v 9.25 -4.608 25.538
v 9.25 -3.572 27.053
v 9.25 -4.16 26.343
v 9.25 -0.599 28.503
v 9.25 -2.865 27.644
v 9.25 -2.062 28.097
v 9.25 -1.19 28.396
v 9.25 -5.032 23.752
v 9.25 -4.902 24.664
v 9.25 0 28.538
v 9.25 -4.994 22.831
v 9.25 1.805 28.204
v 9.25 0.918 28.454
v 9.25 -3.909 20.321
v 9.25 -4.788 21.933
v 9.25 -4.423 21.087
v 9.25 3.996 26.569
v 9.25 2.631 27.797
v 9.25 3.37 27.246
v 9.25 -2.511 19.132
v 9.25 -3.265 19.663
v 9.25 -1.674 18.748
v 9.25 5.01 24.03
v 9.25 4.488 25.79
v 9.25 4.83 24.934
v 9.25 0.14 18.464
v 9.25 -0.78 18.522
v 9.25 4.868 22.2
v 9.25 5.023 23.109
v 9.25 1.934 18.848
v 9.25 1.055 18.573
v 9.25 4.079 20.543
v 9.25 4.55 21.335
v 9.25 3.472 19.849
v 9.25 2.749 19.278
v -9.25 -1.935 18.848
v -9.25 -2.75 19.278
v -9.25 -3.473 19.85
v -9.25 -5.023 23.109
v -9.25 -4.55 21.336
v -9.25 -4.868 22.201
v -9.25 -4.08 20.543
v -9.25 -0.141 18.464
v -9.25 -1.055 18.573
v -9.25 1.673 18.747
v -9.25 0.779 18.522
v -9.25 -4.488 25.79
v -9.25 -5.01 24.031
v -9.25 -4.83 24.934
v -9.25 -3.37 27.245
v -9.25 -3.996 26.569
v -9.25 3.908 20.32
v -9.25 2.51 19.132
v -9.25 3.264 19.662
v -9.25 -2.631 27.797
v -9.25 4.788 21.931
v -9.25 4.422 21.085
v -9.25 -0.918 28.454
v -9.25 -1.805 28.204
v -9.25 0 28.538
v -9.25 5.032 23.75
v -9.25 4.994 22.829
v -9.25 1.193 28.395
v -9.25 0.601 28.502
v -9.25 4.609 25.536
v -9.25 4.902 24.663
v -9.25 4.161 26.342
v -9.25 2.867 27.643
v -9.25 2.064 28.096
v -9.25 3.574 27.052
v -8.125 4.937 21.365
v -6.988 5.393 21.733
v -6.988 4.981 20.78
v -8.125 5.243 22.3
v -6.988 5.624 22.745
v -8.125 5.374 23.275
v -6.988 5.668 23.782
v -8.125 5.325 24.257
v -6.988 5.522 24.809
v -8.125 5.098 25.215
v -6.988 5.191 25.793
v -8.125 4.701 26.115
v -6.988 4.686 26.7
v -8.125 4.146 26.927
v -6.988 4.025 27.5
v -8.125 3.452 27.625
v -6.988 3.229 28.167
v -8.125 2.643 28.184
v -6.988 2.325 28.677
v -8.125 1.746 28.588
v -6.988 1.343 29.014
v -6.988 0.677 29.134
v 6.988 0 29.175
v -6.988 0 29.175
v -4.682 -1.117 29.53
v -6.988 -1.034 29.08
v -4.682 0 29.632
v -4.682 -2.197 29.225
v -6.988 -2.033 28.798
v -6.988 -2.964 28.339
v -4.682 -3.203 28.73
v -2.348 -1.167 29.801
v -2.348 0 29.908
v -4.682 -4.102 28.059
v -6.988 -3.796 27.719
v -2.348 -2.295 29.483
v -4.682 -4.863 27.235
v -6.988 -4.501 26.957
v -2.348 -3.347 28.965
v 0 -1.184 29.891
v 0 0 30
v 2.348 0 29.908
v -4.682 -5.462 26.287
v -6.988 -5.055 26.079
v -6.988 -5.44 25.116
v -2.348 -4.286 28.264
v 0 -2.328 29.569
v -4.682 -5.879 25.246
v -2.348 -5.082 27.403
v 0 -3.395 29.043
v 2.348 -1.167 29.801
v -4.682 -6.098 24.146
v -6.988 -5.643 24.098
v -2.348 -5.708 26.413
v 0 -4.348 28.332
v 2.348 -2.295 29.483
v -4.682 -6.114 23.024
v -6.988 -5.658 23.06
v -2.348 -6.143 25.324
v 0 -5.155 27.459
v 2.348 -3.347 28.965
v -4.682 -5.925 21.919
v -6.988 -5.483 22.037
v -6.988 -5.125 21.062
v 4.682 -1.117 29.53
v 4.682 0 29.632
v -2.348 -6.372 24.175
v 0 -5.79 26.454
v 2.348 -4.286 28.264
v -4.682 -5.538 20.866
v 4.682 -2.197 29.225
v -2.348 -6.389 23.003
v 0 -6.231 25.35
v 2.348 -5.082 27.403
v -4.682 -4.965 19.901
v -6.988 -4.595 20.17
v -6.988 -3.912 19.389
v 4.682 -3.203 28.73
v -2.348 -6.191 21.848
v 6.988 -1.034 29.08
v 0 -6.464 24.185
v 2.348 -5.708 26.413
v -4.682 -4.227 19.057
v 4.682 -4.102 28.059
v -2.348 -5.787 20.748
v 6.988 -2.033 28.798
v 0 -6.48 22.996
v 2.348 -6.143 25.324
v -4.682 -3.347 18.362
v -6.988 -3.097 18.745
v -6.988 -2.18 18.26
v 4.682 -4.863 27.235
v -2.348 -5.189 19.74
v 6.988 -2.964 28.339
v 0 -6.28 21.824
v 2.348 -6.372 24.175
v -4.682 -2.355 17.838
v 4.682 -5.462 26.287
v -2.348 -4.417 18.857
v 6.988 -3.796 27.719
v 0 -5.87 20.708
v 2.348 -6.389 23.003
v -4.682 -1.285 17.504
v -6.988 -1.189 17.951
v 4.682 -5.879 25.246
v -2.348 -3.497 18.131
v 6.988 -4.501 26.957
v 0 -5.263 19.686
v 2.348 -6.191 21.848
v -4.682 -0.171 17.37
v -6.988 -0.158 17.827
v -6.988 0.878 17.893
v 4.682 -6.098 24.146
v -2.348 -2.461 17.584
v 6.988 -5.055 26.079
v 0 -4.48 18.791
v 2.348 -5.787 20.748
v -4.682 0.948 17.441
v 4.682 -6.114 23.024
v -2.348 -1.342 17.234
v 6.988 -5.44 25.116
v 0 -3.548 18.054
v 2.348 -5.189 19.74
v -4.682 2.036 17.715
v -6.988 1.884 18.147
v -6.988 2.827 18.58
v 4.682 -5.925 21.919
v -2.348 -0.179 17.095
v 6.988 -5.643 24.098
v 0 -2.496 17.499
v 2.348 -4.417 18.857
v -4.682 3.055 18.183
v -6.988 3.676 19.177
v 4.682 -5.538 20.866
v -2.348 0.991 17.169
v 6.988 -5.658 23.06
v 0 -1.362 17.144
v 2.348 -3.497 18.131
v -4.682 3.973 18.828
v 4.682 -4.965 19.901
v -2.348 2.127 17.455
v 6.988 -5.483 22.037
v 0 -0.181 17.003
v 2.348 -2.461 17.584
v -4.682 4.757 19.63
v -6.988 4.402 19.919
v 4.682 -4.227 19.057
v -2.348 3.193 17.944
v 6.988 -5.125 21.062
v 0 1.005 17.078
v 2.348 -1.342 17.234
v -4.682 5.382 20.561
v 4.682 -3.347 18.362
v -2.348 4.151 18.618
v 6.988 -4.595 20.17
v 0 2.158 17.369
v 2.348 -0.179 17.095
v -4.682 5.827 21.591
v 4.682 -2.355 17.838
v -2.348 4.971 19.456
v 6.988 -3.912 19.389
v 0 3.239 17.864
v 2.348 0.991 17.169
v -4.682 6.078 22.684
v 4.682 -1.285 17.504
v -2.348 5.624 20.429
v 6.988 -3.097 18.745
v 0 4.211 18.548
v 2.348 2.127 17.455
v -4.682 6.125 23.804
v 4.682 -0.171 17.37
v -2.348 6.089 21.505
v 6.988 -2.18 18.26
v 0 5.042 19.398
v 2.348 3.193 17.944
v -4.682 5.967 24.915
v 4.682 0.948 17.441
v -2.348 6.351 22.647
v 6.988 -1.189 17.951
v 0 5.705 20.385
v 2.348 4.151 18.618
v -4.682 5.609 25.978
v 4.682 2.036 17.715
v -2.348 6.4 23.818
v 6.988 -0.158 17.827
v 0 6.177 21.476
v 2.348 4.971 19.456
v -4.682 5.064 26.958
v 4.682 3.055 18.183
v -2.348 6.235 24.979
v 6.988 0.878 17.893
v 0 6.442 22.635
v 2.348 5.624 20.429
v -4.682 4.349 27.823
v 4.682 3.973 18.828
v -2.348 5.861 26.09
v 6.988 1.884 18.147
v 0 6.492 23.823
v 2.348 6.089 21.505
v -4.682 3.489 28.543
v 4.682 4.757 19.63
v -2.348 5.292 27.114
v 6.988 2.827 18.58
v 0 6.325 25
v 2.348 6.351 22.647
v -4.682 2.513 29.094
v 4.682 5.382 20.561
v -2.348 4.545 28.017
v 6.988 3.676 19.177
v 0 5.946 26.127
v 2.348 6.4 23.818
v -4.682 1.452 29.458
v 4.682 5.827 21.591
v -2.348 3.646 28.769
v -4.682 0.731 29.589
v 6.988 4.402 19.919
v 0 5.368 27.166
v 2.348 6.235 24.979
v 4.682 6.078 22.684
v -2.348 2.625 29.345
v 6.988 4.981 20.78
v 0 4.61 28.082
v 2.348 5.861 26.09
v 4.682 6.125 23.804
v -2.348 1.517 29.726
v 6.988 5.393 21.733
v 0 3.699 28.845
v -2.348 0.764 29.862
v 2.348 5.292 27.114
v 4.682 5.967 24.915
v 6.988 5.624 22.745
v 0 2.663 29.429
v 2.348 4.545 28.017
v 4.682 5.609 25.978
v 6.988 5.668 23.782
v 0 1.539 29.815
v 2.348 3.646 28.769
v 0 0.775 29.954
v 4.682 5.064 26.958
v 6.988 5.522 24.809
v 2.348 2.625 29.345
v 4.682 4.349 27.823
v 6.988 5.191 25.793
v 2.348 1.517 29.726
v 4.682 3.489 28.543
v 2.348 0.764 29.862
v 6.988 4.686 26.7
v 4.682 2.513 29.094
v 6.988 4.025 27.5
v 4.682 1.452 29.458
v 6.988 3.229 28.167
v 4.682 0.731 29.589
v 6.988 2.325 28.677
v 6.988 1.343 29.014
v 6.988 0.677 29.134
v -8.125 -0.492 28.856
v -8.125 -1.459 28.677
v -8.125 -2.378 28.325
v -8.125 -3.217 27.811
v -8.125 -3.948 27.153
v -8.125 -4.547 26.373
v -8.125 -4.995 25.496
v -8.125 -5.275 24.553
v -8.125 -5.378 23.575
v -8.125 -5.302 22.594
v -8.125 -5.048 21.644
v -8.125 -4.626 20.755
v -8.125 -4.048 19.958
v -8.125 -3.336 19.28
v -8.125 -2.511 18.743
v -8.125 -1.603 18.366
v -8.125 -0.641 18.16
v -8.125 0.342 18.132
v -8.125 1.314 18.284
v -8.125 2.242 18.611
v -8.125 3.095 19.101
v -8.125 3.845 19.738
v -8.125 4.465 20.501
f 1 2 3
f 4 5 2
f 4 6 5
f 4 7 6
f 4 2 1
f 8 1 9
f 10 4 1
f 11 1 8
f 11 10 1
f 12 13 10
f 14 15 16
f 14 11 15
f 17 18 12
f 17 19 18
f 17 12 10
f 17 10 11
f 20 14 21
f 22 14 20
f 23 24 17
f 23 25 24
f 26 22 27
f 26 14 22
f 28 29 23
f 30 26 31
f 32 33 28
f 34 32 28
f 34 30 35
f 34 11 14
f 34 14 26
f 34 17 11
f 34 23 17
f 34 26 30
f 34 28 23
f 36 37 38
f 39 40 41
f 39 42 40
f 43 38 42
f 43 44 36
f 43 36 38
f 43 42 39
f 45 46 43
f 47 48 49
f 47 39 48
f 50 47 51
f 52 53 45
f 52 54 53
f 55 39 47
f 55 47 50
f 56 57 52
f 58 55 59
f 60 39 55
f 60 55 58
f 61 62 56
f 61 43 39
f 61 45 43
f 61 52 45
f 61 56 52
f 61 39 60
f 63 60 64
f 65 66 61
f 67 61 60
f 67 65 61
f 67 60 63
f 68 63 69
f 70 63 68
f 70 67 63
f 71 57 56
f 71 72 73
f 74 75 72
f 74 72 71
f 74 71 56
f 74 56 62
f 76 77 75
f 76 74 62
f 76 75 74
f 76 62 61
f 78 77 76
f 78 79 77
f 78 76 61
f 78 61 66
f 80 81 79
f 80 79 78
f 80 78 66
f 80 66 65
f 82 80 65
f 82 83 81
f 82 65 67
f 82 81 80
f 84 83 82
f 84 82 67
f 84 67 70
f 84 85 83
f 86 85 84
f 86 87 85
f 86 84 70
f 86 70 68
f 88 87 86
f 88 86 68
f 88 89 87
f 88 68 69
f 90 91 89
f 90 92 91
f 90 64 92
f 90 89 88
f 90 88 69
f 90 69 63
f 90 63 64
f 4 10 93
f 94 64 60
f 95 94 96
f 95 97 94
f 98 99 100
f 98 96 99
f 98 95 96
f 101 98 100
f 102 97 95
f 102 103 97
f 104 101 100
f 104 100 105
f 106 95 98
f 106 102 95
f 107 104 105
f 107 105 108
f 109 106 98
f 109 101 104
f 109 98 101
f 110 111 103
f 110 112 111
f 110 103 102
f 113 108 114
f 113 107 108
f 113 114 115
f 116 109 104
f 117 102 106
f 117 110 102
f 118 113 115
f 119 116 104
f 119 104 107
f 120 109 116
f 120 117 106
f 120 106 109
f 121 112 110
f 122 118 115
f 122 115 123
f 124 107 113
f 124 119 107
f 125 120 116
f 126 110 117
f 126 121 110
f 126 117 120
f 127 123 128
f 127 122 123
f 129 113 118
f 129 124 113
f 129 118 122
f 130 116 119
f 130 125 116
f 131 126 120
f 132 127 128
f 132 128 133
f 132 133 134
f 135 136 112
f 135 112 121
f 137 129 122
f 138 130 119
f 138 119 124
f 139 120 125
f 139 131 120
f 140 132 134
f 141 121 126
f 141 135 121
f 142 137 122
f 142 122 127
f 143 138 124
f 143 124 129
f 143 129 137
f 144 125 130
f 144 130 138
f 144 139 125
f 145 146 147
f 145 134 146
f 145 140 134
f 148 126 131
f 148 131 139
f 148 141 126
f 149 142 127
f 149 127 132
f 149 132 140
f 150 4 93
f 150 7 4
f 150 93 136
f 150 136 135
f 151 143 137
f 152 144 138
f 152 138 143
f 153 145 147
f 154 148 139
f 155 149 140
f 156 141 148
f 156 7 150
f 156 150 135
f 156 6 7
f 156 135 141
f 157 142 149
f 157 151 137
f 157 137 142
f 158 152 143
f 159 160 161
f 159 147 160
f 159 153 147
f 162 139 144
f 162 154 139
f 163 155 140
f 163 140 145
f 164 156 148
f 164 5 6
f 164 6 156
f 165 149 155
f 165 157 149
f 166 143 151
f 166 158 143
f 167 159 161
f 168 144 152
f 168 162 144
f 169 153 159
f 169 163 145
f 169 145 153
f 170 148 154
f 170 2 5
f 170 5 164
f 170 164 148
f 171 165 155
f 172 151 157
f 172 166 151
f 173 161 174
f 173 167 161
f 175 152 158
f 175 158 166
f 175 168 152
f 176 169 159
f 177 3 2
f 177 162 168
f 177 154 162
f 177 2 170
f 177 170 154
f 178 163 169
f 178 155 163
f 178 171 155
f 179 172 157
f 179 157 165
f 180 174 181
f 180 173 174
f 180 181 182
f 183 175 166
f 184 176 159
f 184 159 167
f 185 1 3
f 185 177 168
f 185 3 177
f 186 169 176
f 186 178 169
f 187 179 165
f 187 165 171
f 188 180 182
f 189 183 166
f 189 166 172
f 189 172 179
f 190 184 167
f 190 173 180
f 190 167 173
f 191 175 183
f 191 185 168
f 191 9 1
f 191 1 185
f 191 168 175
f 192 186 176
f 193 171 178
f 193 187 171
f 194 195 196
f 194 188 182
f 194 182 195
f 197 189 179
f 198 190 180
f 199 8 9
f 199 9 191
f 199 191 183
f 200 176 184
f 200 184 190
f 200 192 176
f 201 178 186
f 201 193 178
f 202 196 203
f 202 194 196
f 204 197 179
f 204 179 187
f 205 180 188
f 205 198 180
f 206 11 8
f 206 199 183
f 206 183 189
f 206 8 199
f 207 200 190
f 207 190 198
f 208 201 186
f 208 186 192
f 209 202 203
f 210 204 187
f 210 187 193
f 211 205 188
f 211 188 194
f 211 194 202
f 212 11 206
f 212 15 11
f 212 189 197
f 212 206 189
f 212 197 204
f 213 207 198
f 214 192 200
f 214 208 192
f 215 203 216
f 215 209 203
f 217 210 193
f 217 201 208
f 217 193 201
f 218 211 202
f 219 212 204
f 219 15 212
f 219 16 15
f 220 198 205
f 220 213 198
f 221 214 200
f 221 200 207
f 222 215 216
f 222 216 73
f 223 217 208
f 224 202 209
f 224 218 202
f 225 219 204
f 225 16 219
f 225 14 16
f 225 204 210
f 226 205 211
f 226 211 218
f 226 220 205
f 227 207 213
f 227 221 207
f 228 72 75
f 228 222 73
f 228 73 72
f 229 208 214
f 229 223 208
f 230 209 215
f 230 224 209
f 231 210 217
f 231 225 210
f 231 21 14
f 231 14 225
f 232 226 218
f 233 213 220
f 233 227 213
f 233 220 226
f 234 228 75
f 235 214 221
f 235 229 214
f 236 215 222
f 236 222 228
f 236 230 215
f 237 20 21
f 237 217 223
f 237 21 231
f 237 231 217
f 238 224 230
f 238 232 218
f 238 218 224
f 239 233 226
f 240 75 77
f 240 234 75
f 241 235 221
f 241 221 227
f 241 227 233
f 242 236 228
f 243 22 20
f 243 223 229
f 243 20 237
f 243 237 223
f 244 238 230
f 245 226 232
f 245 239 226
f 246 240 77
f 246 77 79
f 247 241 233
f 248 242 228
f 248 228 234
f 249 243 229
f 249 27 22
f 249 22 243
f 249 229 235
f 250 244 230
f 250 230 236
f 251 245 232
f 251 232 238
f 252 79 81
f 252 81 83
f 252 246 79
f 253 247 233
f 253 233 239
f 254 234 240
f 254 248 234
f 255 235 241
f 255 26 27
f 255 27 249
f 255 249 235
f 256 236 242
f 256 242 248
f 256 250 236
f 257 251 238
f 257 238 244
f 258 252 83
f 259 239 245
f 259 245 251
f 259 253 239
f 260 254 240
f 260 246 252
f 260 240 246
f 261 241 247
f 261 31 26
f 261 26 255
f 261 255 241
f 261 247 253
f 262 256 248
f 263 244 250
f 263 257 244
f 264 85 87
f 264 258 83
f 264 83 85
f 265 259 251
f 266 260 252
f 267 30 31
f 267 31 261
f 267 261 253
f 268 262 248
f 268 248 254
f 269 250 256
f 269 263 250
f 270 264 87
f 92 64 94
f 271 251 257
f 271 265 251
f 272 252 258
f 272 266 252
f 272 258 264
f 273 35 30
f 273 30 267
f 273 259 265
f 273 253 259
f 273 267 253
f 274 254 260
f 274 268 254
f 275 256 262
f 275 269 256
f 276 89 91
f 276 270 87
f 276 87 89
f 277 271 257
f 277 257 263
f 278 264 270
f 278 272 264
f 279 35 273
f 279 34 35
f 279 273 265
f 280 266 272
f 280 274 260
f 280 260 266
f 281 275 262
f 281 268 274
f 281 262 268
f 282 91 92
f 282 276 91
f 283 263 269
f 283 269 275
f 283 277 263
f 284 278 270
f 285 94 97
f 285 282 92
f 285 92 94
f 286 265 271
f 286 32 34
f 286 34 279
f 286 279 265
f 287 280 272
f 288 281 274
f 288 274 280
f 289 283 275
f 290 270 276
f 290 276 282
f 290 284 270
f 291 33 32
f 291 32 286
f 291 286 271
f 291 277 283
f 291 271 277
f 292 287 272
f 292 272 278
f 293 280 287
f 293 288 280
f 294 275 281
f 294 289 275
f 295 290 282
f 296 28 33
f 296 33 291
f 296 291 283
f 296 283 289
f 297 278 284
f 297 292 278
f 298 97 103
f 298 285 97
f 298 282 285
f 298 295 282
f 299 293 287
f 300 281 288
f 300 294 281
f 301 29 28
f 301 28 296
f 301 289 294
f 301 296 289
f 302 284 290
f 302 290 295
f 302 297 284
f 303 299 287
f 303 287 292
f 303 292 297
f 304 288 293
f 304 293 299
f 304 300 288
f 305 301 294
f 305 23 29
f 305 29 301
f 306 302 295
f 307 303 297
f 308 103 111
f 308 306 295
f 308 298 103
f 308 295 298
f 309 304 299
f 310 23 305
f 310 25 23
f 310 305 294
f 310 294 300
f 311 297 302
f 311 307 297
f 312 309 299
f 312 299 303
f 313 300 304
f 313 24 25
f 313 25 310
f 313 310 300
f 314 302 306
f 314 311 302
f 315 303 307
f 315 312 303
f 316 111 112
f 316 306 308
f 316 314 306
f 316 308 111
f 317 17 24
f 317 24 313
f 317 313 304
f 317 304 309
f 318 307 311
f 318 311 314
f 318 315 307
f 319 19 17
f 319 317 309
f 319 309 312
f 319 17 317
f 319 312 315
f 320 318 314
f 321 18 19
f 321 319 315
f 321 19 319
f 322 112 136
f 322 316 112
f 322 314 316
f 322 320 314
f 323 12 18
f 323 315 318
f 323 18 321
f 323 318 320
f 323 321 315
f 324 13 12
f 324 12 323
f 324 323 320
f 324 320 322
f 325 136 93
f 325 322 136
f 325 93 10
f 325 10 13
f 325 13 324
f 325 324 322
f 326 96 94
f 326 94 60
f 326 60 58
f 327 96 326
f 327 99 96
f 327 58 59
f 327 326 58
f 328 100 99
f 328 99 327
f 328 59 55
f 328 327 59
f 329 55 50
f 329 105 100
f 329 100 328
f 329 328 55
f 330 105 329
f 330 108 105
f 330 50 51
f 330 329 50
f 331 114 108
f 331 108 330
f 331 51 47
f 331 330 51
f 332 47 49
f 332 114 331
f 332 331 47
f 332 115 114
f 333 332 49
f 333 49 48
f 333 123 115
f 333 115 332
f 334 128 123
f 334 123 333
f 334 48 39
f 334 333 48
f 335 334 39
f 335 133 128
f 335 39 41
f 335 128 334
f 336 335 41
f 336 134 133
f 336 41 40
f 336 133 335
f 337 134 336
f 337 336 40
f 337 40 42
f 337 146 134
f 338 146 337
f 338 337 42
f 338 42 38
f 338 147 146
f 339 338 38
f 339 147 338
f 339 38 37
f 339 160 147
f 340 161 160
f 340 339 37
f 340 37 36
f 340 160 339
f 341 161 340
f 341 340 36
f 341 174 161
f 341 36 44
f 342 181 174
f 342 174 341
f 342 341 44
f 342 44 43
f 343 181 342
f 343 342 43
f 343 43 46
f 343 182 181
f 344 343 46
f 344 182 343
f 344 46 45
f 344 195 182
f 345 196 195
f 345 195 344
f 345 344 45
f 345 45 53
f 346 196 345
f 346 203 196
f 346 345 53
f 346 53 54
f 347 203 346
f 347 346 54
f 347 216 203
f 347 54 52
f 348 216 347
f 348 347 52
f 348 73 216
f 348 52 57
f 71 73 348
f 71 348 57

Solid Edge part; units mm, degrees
sketch "Sketch1" plane through (0, 0, 0) normal (0, -1, 0) x (1, 0, 0)
  arc A0 (-18.6481, 23.5) -> (18.6481, 23.5) centre (0, 0) cw
  line L0 (0, 23.5) -> (18.6481, 23.5)
  line L1 (0, 23.5) -> (-18.6481, 23.5)
revolve "RevolvedProtrusion1" add sketch "Sketch1" angle 360 about axis through (0, 0, 23.5) along (1, 0, 0)
sketch "Sketch2" plane through (0, 0, 0) normal (0, -1, 0) x (1, 0, 0)
  line L0 (-9.25, 28.5384) -> (-18.6481, 28.5384)
  line L1 (-18.6481, 28.5384) -> (-18.6481, 23.5)
  line L2 (-18.6481, 23.5) -> (-9.25, 23.5)
  line L3 (-9.25, 23.5) -> (-9.25, 28.5384)
extrude "Cutout1" cut sketch "Sketch2" along normal mid plane 171.1922
mirror "Mirror1" about plane through (-13.949, 0, 23.5) normal (0, 0, 1) of "Cutout1"
mirror "Mirror2" about plane through (0, 0, 0) normal (-1, 0, 0) of "Cutout1", "Mirror1"
properties material "Wheel2"
